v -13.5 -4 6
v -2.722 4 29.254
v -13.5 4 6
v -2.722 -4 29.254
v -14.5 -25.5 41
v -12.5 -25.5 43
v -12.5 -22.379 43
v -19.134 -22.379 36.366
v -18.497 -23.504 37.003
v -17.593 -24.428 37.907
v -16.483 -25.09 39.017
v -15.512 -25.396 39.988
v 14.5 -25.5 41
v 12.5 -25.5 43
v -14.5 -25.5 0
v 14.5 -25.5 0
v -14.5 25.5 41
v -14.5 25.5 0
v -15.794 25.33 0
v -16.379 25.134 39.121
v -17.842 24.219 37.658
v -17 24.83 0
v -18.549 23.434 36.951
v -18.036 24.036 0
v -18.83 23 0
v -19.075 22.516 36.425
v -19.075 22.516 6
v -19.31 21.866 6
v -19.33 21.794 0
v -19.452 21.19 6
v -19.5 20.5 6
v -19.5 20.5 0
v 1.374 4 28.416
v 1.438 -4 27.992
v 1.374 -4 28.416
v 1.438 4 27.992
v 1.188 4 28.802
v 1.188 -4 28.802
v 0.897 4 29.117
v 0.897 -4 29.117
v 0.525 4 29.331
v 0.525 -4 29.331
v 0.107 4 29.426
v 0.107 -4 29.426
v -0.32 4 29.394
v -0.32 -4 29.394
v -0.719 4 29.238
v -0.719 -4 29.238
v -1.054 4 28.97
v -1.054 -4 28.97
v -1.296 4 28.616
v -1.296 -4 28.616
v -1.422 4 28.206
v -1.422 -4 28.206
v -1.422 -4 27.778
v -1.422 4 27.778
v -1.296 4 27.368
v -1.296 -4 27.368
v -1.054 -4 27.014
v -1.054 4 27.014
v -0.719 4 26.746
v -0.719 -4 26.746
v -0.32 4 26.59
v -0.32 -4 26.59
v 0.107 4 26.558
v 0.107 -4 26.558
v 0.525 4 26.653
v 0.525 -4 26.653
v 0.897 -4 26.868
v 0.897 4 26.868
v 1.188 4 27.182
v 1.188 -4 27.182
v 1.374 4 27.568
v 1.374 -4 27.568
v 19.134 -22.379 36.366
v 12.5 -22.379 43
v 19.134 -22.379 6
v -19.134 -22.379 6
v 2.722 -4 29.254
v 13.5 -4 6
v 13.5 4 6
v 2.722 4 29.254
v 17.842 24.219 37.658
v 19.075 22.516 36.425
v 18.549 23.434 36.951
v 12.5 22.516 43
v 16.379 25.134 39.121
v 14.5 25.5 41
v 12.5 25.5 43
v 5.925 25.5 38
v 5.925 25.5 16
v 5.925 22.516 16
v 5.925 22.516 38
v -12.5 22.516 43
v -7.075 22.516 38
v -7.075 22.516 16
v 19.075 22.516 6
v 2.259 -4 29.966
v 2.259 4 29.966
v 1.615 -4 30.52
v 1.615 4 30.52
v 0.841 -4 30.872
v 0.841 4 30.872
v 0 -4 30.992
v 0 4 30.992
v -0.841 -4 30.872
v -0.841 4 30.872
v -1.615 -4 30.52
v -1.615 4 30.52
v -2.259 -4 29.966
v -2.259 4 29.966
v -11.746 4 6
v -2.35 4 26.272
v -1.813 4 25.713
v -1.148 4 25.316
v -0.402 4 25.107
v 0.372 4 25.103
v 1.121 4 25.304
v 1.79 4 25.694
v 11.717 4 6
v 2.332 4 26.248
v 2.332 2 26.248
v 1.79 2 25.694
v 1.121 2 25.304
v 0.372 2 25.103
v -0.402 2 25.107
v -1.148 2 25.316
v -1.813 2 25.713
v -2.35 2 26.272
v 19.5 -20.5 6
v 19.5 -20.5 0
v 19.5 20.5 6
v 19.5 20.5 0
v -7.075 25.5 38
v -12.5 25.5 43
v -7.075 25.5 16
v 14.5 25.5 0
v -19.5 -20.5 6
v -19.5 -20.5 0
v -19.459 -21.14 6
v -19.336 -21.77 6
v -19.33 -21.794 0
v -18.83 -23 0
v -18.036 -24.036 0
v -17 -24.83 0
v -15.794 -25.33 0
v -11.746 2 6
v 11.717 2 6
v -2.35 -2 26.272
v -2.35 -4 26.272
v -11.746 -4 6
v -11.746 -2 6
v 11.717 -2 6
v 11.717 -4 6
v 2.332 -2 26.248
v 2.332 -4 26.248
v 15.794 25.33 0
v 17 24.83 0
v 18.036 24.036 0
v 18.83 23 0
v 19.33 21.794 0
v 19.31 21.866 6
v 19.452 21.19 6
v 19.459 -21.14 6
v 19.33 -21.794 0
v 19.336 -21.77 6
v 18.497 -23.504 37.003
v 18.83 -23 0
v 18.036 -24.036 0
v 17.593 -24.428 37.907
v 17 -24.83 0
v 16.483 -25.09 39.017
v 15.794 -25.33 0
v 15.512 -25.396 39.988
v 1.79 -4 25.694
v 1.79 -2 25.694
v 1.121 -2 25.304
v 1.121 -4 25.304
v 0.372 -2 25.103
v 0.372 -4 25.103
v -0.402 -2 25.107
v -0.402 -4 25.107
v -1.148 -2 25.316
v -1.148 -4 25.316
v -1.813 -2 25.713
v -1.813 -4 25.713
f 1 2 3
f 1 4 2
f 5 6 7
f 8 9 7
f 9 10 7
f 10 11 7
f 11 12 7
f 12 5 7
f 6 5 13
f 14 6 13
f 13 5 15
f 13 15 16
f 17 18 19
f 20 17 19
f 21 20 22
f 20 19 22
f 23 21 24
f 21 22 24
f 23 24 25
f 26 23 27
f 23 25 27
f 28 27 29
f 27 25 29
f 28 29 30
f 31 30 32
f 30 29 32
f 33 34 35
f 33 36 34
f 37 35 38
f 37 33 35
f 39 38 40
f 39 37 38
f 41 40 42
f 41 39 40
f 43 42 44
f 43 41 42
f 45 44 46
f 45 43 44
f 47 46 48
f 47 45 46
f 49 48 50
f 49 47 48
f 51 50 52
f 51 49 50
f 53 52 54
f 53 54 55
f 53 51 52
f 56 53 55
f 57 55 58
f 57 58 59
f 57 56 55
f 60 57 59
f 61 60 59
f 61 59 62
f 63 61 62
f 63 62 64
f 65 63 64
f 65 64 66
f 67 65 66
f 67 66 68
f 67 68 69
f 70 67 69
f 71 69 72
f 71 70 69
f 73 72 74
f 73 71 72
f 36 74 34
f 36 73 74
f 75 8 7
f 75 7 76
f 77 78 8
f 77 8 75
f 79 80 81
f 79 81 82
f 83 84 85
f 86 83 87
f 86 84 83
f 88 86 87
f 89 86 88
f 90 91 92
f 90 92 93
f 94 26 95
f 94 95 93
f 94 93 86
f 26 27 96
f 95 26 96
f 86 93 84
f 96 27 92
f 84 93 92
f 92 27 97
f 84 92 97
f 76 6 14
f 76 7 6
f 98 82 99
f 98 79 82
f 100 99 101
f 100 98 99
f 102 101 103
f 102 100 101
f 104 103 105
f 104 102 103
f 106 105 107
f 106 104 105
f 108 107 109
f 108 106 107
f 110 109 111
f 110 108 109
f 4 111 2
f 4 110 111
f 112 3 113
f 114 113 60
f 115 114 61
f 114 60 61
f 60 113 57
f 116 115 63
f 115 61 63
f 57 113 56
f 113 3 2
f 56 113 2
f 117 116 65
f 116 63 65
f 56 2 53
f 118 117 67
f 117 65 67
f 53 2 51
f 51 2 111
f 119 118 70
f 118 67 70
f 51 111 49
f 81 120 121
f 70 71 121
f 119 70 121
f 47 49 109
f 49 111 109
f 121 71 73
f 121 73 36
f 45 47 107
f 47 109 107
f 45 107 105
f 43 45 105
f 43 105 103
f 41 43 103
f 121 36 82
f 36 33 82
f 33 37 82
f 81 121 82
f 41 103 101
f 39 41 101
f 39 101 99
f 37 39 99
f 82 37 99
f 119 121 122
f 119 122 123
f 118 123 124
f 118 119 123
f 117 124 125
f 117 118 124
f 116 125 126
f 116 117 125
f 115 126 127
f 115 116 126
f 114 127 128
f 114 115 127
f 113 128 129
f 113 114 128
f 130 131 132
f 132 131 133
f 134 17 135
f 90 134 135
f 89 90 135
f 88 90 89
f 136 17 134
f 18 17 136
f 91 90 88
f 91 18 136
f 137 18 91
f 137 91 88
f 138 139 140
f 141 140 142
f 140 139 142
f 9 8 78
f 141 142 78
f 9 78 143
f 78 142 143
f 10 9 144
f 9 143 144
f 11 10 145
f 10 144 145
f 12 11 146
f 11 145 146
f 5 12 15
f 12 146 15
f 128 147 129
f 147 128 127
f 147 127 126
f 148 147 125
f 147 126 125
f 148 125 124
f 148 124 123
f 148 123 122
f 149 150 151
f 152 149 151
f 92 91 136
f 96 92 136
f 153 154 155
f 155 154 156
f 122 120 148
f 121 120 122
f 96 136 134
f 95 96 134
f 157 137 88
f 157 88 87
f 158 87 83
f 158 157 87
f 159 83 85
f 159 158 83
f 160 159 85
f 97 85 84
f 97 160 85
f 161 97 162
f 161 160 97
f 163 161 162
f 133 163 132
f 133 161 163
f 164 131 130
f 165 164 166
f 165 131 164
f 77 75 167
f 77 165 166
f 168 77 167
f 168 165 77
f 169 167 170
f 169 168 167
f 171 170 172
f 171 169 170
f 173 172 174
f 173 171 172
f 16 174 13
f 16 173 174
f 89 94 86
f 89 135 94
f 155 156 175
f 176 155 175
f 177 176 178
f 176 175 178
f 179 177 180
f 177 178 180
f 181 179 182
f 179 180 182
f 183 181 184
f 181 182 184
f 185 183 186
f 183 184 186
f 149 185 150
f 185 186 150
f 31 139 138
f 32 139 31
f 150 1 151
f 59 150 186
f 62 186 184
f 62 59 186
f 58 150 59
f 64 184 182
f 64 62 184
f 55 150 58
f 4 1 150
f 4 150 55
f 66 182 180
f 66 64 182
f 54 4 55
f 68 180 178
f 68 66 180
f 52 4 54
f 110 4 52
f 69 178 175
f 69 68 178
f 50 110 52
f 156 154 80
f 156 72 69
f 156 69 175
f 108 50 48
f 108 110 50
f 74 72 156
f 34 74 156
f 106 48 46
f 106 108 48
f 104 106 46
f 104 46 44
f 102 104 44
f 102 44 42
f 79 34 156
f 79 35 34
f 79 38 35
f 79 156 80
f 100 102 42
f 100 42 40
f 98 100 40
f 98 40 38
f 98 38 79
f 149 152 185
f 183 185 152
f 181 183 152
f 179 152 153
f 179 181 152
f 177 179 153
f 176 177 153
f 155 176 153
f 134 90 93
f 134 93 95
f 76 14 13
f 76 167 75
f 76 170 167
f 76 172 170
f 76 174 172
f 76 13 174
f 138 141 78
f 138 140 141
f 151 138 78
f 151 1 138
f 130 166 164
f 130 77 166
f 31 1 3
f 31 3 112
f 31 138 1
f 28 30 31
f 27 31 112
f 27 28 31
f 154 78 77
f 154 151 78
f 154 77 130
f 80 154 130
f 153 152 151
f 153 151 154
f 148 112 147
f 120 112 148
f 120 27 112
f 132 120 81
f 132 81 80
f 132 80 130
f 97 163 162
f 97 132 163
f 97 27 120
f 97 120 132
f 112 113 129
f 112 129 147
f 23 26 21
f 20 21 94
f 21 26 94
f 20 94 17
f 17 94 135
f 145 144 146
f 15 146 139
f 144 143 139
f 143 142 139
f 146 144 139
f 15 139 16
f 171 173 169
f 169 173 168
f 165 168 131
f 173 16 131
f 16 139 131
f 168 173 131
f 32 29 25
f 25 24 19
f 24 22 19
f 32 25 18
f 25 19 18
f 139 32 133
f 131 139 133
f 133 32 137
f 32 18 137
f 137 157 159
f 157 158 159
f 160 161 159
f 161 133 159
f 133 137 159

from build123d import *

# Parameters (mm, degrees)
F0_W          = 39
F0_H          = 51
F1_DEPTH      = 6
F2_R          = 1.4383077573
F3_DEPTH      = 4
F3_DEPTH_BACK = 4
F5_DEPTH      = 2
F6_W          = 39
F6_H          = 2.9835407734
F6_H_2        = 3.1214025915
F7_DEPTH      = 37
F8_SIZE       = 7
F9_T1_DEPTH   = 61
F10_W         = 13
F10_H         = 22
F11_DEPTH     = 15.8


# Not quite as in the source:
# - a fillet or chamfer that OpenCascade refuses, or shapes differently, is made with other operations: its cross-section is extruded or revolved along the edge and cut away or added
# - a pattern or mirror of a feature is missing from the dataset's text; its kind, count and spacing are read off the source's solid


with BuildPart() as f1:
    # F0 (on Top) → F1 (new body)
    with BuildSketch(Plane.XY):
        Rectangle(F0_W, F0_H)
    extrude(amount=F1_DEPTH)

    # F2 (on Front) → F3 (join, two sides)
    with BuildSketch(Plane.XZ) as f3_sk:
        with BuildLine():
            Line((-2.7218379916, 29.2536051472), (-13.5, 6))
            Line((-13.5, 6), (13.5, 6))
            Line((13.5, 6), (2.7218379916, 29.2536051472))
            ThreePointArc((2.7218379916, 29.2536051472), (0, 30.9920196576), (-2.7218379916, 29.2536051472))
        make_face()
        with Locations((0, 27.9920196576)):
            Circle(F2_R, mode=Mode.SUBTRACT)
    extrude(amount=F3_DEPTH)
    extrude(f3_sk.sketch, amount=-F3_DEPTH_BACK)

    # F4 (on face) → F5 (cut)
    with BuildSketch(Plane.XZ.offset(4)):
        with BuildLine():
            Line((-2.3500163027, 26.2716104284), (-11.7460088804, 6))
            Line((-11.7460088804, 6), (11.7170447484, 6))
            Line((11.7170447484, 6), (2.3322070272, 26.2475441144))
            ThreePointArc((2.3322070272, 26.2475441144), (-0.0149696172, 25.0796047749), (-2.3500163027, 26.2716104284))
        make_face()
    f5 = extrude(amount=-F5_DEPTH, mode=Mode.SUBTRACT)

    # F5_copies: F5 across plane
    add(f5.mirror(Plane.ZX), mode=Mode.SUBTRACT)

    # F6 (on face) → F7 (join)
    with BuildSketch(Plane.XY.offset(6)):
        with Locations((0, 24.0082296133)):
            Rectangle(F6_W, F6_H)
        with Locations((0, -23.9392987043)):
            Rectangle(F6_W, F6_H_2)
    extrude(amount=F7_DEPTH)

    # F8
    f8_edges = [f1.edges().sort_by_distance(p)[0] for p in [
        (19.5, 24.00823, 43),
        (-19.5, 24.00823, 43),
        (-19.5, -23.939299, 43),
        (19.5, -23.939299, 43),
    ]]
    chamfer(f8_edges, length=F8_SIZE)

    # F9: fillet of radius 5 on 4 edges, made by hand

    # F9_s2 → F9_t1 (cut)
    with BuildSketch(Plane.XY.offset(-12.5)):
        with BuildLine():
            ThreePointArc((19.5, -20.5), (18.0355339059, -24.0355339059), (14.5, -25.5))
            Line((14.5, -25.5), (19.5, -25.5))
            Line((19.5, -25.5), (19.5, -20.5))
        make_face()
        with BuildLine():
            ThreePointArc((-19.5, -20.5), (-18.0355339059, -24.0355339059), (-14.5, -25.5))
            Line((-14.5, -25.5), (-19.5, -25.5))
            Line((-19.5, -25.5), (-19.5, -20.5))
        make_face()
        with BuildLine():
            ThreePointArc((14.5, 25.5), (18.0355339059, 24.0355339059), (19.5, 20.5))
            Line((19.5, 20.5), (19.5, 25.5))
            Line((19.5, 25.5), (14.5, 25.5))
        make_face()
        with BuildLine():
            ThreePointArc((-14.5, 25.5), (-18.0355339059, 24.0355339059), (-19.5, 20.5))
            Line((-19.5, 20.5), (-19.5, 25.5))
            Line((-19.5, 25.5), (-14.5, 25.5))
        make_face()
    extrude(amount=F9_T1_DEPTH, mode=Mode.SUBTRACT)

    # F10 (on face) → F11 (cut)
    with BuildSketch(Plane(origin=(0, 25.5, 0), x_dir=(-1, 0, 0), z_dir=(0, 1, 0))):
        with Locations((0.5753570557, 27)):
            Rectangle(F10_W, F10_H)
    extrude(amount=-F11_DEPTH, mode=Mode.SUBTRACT)


solid = f1.part
